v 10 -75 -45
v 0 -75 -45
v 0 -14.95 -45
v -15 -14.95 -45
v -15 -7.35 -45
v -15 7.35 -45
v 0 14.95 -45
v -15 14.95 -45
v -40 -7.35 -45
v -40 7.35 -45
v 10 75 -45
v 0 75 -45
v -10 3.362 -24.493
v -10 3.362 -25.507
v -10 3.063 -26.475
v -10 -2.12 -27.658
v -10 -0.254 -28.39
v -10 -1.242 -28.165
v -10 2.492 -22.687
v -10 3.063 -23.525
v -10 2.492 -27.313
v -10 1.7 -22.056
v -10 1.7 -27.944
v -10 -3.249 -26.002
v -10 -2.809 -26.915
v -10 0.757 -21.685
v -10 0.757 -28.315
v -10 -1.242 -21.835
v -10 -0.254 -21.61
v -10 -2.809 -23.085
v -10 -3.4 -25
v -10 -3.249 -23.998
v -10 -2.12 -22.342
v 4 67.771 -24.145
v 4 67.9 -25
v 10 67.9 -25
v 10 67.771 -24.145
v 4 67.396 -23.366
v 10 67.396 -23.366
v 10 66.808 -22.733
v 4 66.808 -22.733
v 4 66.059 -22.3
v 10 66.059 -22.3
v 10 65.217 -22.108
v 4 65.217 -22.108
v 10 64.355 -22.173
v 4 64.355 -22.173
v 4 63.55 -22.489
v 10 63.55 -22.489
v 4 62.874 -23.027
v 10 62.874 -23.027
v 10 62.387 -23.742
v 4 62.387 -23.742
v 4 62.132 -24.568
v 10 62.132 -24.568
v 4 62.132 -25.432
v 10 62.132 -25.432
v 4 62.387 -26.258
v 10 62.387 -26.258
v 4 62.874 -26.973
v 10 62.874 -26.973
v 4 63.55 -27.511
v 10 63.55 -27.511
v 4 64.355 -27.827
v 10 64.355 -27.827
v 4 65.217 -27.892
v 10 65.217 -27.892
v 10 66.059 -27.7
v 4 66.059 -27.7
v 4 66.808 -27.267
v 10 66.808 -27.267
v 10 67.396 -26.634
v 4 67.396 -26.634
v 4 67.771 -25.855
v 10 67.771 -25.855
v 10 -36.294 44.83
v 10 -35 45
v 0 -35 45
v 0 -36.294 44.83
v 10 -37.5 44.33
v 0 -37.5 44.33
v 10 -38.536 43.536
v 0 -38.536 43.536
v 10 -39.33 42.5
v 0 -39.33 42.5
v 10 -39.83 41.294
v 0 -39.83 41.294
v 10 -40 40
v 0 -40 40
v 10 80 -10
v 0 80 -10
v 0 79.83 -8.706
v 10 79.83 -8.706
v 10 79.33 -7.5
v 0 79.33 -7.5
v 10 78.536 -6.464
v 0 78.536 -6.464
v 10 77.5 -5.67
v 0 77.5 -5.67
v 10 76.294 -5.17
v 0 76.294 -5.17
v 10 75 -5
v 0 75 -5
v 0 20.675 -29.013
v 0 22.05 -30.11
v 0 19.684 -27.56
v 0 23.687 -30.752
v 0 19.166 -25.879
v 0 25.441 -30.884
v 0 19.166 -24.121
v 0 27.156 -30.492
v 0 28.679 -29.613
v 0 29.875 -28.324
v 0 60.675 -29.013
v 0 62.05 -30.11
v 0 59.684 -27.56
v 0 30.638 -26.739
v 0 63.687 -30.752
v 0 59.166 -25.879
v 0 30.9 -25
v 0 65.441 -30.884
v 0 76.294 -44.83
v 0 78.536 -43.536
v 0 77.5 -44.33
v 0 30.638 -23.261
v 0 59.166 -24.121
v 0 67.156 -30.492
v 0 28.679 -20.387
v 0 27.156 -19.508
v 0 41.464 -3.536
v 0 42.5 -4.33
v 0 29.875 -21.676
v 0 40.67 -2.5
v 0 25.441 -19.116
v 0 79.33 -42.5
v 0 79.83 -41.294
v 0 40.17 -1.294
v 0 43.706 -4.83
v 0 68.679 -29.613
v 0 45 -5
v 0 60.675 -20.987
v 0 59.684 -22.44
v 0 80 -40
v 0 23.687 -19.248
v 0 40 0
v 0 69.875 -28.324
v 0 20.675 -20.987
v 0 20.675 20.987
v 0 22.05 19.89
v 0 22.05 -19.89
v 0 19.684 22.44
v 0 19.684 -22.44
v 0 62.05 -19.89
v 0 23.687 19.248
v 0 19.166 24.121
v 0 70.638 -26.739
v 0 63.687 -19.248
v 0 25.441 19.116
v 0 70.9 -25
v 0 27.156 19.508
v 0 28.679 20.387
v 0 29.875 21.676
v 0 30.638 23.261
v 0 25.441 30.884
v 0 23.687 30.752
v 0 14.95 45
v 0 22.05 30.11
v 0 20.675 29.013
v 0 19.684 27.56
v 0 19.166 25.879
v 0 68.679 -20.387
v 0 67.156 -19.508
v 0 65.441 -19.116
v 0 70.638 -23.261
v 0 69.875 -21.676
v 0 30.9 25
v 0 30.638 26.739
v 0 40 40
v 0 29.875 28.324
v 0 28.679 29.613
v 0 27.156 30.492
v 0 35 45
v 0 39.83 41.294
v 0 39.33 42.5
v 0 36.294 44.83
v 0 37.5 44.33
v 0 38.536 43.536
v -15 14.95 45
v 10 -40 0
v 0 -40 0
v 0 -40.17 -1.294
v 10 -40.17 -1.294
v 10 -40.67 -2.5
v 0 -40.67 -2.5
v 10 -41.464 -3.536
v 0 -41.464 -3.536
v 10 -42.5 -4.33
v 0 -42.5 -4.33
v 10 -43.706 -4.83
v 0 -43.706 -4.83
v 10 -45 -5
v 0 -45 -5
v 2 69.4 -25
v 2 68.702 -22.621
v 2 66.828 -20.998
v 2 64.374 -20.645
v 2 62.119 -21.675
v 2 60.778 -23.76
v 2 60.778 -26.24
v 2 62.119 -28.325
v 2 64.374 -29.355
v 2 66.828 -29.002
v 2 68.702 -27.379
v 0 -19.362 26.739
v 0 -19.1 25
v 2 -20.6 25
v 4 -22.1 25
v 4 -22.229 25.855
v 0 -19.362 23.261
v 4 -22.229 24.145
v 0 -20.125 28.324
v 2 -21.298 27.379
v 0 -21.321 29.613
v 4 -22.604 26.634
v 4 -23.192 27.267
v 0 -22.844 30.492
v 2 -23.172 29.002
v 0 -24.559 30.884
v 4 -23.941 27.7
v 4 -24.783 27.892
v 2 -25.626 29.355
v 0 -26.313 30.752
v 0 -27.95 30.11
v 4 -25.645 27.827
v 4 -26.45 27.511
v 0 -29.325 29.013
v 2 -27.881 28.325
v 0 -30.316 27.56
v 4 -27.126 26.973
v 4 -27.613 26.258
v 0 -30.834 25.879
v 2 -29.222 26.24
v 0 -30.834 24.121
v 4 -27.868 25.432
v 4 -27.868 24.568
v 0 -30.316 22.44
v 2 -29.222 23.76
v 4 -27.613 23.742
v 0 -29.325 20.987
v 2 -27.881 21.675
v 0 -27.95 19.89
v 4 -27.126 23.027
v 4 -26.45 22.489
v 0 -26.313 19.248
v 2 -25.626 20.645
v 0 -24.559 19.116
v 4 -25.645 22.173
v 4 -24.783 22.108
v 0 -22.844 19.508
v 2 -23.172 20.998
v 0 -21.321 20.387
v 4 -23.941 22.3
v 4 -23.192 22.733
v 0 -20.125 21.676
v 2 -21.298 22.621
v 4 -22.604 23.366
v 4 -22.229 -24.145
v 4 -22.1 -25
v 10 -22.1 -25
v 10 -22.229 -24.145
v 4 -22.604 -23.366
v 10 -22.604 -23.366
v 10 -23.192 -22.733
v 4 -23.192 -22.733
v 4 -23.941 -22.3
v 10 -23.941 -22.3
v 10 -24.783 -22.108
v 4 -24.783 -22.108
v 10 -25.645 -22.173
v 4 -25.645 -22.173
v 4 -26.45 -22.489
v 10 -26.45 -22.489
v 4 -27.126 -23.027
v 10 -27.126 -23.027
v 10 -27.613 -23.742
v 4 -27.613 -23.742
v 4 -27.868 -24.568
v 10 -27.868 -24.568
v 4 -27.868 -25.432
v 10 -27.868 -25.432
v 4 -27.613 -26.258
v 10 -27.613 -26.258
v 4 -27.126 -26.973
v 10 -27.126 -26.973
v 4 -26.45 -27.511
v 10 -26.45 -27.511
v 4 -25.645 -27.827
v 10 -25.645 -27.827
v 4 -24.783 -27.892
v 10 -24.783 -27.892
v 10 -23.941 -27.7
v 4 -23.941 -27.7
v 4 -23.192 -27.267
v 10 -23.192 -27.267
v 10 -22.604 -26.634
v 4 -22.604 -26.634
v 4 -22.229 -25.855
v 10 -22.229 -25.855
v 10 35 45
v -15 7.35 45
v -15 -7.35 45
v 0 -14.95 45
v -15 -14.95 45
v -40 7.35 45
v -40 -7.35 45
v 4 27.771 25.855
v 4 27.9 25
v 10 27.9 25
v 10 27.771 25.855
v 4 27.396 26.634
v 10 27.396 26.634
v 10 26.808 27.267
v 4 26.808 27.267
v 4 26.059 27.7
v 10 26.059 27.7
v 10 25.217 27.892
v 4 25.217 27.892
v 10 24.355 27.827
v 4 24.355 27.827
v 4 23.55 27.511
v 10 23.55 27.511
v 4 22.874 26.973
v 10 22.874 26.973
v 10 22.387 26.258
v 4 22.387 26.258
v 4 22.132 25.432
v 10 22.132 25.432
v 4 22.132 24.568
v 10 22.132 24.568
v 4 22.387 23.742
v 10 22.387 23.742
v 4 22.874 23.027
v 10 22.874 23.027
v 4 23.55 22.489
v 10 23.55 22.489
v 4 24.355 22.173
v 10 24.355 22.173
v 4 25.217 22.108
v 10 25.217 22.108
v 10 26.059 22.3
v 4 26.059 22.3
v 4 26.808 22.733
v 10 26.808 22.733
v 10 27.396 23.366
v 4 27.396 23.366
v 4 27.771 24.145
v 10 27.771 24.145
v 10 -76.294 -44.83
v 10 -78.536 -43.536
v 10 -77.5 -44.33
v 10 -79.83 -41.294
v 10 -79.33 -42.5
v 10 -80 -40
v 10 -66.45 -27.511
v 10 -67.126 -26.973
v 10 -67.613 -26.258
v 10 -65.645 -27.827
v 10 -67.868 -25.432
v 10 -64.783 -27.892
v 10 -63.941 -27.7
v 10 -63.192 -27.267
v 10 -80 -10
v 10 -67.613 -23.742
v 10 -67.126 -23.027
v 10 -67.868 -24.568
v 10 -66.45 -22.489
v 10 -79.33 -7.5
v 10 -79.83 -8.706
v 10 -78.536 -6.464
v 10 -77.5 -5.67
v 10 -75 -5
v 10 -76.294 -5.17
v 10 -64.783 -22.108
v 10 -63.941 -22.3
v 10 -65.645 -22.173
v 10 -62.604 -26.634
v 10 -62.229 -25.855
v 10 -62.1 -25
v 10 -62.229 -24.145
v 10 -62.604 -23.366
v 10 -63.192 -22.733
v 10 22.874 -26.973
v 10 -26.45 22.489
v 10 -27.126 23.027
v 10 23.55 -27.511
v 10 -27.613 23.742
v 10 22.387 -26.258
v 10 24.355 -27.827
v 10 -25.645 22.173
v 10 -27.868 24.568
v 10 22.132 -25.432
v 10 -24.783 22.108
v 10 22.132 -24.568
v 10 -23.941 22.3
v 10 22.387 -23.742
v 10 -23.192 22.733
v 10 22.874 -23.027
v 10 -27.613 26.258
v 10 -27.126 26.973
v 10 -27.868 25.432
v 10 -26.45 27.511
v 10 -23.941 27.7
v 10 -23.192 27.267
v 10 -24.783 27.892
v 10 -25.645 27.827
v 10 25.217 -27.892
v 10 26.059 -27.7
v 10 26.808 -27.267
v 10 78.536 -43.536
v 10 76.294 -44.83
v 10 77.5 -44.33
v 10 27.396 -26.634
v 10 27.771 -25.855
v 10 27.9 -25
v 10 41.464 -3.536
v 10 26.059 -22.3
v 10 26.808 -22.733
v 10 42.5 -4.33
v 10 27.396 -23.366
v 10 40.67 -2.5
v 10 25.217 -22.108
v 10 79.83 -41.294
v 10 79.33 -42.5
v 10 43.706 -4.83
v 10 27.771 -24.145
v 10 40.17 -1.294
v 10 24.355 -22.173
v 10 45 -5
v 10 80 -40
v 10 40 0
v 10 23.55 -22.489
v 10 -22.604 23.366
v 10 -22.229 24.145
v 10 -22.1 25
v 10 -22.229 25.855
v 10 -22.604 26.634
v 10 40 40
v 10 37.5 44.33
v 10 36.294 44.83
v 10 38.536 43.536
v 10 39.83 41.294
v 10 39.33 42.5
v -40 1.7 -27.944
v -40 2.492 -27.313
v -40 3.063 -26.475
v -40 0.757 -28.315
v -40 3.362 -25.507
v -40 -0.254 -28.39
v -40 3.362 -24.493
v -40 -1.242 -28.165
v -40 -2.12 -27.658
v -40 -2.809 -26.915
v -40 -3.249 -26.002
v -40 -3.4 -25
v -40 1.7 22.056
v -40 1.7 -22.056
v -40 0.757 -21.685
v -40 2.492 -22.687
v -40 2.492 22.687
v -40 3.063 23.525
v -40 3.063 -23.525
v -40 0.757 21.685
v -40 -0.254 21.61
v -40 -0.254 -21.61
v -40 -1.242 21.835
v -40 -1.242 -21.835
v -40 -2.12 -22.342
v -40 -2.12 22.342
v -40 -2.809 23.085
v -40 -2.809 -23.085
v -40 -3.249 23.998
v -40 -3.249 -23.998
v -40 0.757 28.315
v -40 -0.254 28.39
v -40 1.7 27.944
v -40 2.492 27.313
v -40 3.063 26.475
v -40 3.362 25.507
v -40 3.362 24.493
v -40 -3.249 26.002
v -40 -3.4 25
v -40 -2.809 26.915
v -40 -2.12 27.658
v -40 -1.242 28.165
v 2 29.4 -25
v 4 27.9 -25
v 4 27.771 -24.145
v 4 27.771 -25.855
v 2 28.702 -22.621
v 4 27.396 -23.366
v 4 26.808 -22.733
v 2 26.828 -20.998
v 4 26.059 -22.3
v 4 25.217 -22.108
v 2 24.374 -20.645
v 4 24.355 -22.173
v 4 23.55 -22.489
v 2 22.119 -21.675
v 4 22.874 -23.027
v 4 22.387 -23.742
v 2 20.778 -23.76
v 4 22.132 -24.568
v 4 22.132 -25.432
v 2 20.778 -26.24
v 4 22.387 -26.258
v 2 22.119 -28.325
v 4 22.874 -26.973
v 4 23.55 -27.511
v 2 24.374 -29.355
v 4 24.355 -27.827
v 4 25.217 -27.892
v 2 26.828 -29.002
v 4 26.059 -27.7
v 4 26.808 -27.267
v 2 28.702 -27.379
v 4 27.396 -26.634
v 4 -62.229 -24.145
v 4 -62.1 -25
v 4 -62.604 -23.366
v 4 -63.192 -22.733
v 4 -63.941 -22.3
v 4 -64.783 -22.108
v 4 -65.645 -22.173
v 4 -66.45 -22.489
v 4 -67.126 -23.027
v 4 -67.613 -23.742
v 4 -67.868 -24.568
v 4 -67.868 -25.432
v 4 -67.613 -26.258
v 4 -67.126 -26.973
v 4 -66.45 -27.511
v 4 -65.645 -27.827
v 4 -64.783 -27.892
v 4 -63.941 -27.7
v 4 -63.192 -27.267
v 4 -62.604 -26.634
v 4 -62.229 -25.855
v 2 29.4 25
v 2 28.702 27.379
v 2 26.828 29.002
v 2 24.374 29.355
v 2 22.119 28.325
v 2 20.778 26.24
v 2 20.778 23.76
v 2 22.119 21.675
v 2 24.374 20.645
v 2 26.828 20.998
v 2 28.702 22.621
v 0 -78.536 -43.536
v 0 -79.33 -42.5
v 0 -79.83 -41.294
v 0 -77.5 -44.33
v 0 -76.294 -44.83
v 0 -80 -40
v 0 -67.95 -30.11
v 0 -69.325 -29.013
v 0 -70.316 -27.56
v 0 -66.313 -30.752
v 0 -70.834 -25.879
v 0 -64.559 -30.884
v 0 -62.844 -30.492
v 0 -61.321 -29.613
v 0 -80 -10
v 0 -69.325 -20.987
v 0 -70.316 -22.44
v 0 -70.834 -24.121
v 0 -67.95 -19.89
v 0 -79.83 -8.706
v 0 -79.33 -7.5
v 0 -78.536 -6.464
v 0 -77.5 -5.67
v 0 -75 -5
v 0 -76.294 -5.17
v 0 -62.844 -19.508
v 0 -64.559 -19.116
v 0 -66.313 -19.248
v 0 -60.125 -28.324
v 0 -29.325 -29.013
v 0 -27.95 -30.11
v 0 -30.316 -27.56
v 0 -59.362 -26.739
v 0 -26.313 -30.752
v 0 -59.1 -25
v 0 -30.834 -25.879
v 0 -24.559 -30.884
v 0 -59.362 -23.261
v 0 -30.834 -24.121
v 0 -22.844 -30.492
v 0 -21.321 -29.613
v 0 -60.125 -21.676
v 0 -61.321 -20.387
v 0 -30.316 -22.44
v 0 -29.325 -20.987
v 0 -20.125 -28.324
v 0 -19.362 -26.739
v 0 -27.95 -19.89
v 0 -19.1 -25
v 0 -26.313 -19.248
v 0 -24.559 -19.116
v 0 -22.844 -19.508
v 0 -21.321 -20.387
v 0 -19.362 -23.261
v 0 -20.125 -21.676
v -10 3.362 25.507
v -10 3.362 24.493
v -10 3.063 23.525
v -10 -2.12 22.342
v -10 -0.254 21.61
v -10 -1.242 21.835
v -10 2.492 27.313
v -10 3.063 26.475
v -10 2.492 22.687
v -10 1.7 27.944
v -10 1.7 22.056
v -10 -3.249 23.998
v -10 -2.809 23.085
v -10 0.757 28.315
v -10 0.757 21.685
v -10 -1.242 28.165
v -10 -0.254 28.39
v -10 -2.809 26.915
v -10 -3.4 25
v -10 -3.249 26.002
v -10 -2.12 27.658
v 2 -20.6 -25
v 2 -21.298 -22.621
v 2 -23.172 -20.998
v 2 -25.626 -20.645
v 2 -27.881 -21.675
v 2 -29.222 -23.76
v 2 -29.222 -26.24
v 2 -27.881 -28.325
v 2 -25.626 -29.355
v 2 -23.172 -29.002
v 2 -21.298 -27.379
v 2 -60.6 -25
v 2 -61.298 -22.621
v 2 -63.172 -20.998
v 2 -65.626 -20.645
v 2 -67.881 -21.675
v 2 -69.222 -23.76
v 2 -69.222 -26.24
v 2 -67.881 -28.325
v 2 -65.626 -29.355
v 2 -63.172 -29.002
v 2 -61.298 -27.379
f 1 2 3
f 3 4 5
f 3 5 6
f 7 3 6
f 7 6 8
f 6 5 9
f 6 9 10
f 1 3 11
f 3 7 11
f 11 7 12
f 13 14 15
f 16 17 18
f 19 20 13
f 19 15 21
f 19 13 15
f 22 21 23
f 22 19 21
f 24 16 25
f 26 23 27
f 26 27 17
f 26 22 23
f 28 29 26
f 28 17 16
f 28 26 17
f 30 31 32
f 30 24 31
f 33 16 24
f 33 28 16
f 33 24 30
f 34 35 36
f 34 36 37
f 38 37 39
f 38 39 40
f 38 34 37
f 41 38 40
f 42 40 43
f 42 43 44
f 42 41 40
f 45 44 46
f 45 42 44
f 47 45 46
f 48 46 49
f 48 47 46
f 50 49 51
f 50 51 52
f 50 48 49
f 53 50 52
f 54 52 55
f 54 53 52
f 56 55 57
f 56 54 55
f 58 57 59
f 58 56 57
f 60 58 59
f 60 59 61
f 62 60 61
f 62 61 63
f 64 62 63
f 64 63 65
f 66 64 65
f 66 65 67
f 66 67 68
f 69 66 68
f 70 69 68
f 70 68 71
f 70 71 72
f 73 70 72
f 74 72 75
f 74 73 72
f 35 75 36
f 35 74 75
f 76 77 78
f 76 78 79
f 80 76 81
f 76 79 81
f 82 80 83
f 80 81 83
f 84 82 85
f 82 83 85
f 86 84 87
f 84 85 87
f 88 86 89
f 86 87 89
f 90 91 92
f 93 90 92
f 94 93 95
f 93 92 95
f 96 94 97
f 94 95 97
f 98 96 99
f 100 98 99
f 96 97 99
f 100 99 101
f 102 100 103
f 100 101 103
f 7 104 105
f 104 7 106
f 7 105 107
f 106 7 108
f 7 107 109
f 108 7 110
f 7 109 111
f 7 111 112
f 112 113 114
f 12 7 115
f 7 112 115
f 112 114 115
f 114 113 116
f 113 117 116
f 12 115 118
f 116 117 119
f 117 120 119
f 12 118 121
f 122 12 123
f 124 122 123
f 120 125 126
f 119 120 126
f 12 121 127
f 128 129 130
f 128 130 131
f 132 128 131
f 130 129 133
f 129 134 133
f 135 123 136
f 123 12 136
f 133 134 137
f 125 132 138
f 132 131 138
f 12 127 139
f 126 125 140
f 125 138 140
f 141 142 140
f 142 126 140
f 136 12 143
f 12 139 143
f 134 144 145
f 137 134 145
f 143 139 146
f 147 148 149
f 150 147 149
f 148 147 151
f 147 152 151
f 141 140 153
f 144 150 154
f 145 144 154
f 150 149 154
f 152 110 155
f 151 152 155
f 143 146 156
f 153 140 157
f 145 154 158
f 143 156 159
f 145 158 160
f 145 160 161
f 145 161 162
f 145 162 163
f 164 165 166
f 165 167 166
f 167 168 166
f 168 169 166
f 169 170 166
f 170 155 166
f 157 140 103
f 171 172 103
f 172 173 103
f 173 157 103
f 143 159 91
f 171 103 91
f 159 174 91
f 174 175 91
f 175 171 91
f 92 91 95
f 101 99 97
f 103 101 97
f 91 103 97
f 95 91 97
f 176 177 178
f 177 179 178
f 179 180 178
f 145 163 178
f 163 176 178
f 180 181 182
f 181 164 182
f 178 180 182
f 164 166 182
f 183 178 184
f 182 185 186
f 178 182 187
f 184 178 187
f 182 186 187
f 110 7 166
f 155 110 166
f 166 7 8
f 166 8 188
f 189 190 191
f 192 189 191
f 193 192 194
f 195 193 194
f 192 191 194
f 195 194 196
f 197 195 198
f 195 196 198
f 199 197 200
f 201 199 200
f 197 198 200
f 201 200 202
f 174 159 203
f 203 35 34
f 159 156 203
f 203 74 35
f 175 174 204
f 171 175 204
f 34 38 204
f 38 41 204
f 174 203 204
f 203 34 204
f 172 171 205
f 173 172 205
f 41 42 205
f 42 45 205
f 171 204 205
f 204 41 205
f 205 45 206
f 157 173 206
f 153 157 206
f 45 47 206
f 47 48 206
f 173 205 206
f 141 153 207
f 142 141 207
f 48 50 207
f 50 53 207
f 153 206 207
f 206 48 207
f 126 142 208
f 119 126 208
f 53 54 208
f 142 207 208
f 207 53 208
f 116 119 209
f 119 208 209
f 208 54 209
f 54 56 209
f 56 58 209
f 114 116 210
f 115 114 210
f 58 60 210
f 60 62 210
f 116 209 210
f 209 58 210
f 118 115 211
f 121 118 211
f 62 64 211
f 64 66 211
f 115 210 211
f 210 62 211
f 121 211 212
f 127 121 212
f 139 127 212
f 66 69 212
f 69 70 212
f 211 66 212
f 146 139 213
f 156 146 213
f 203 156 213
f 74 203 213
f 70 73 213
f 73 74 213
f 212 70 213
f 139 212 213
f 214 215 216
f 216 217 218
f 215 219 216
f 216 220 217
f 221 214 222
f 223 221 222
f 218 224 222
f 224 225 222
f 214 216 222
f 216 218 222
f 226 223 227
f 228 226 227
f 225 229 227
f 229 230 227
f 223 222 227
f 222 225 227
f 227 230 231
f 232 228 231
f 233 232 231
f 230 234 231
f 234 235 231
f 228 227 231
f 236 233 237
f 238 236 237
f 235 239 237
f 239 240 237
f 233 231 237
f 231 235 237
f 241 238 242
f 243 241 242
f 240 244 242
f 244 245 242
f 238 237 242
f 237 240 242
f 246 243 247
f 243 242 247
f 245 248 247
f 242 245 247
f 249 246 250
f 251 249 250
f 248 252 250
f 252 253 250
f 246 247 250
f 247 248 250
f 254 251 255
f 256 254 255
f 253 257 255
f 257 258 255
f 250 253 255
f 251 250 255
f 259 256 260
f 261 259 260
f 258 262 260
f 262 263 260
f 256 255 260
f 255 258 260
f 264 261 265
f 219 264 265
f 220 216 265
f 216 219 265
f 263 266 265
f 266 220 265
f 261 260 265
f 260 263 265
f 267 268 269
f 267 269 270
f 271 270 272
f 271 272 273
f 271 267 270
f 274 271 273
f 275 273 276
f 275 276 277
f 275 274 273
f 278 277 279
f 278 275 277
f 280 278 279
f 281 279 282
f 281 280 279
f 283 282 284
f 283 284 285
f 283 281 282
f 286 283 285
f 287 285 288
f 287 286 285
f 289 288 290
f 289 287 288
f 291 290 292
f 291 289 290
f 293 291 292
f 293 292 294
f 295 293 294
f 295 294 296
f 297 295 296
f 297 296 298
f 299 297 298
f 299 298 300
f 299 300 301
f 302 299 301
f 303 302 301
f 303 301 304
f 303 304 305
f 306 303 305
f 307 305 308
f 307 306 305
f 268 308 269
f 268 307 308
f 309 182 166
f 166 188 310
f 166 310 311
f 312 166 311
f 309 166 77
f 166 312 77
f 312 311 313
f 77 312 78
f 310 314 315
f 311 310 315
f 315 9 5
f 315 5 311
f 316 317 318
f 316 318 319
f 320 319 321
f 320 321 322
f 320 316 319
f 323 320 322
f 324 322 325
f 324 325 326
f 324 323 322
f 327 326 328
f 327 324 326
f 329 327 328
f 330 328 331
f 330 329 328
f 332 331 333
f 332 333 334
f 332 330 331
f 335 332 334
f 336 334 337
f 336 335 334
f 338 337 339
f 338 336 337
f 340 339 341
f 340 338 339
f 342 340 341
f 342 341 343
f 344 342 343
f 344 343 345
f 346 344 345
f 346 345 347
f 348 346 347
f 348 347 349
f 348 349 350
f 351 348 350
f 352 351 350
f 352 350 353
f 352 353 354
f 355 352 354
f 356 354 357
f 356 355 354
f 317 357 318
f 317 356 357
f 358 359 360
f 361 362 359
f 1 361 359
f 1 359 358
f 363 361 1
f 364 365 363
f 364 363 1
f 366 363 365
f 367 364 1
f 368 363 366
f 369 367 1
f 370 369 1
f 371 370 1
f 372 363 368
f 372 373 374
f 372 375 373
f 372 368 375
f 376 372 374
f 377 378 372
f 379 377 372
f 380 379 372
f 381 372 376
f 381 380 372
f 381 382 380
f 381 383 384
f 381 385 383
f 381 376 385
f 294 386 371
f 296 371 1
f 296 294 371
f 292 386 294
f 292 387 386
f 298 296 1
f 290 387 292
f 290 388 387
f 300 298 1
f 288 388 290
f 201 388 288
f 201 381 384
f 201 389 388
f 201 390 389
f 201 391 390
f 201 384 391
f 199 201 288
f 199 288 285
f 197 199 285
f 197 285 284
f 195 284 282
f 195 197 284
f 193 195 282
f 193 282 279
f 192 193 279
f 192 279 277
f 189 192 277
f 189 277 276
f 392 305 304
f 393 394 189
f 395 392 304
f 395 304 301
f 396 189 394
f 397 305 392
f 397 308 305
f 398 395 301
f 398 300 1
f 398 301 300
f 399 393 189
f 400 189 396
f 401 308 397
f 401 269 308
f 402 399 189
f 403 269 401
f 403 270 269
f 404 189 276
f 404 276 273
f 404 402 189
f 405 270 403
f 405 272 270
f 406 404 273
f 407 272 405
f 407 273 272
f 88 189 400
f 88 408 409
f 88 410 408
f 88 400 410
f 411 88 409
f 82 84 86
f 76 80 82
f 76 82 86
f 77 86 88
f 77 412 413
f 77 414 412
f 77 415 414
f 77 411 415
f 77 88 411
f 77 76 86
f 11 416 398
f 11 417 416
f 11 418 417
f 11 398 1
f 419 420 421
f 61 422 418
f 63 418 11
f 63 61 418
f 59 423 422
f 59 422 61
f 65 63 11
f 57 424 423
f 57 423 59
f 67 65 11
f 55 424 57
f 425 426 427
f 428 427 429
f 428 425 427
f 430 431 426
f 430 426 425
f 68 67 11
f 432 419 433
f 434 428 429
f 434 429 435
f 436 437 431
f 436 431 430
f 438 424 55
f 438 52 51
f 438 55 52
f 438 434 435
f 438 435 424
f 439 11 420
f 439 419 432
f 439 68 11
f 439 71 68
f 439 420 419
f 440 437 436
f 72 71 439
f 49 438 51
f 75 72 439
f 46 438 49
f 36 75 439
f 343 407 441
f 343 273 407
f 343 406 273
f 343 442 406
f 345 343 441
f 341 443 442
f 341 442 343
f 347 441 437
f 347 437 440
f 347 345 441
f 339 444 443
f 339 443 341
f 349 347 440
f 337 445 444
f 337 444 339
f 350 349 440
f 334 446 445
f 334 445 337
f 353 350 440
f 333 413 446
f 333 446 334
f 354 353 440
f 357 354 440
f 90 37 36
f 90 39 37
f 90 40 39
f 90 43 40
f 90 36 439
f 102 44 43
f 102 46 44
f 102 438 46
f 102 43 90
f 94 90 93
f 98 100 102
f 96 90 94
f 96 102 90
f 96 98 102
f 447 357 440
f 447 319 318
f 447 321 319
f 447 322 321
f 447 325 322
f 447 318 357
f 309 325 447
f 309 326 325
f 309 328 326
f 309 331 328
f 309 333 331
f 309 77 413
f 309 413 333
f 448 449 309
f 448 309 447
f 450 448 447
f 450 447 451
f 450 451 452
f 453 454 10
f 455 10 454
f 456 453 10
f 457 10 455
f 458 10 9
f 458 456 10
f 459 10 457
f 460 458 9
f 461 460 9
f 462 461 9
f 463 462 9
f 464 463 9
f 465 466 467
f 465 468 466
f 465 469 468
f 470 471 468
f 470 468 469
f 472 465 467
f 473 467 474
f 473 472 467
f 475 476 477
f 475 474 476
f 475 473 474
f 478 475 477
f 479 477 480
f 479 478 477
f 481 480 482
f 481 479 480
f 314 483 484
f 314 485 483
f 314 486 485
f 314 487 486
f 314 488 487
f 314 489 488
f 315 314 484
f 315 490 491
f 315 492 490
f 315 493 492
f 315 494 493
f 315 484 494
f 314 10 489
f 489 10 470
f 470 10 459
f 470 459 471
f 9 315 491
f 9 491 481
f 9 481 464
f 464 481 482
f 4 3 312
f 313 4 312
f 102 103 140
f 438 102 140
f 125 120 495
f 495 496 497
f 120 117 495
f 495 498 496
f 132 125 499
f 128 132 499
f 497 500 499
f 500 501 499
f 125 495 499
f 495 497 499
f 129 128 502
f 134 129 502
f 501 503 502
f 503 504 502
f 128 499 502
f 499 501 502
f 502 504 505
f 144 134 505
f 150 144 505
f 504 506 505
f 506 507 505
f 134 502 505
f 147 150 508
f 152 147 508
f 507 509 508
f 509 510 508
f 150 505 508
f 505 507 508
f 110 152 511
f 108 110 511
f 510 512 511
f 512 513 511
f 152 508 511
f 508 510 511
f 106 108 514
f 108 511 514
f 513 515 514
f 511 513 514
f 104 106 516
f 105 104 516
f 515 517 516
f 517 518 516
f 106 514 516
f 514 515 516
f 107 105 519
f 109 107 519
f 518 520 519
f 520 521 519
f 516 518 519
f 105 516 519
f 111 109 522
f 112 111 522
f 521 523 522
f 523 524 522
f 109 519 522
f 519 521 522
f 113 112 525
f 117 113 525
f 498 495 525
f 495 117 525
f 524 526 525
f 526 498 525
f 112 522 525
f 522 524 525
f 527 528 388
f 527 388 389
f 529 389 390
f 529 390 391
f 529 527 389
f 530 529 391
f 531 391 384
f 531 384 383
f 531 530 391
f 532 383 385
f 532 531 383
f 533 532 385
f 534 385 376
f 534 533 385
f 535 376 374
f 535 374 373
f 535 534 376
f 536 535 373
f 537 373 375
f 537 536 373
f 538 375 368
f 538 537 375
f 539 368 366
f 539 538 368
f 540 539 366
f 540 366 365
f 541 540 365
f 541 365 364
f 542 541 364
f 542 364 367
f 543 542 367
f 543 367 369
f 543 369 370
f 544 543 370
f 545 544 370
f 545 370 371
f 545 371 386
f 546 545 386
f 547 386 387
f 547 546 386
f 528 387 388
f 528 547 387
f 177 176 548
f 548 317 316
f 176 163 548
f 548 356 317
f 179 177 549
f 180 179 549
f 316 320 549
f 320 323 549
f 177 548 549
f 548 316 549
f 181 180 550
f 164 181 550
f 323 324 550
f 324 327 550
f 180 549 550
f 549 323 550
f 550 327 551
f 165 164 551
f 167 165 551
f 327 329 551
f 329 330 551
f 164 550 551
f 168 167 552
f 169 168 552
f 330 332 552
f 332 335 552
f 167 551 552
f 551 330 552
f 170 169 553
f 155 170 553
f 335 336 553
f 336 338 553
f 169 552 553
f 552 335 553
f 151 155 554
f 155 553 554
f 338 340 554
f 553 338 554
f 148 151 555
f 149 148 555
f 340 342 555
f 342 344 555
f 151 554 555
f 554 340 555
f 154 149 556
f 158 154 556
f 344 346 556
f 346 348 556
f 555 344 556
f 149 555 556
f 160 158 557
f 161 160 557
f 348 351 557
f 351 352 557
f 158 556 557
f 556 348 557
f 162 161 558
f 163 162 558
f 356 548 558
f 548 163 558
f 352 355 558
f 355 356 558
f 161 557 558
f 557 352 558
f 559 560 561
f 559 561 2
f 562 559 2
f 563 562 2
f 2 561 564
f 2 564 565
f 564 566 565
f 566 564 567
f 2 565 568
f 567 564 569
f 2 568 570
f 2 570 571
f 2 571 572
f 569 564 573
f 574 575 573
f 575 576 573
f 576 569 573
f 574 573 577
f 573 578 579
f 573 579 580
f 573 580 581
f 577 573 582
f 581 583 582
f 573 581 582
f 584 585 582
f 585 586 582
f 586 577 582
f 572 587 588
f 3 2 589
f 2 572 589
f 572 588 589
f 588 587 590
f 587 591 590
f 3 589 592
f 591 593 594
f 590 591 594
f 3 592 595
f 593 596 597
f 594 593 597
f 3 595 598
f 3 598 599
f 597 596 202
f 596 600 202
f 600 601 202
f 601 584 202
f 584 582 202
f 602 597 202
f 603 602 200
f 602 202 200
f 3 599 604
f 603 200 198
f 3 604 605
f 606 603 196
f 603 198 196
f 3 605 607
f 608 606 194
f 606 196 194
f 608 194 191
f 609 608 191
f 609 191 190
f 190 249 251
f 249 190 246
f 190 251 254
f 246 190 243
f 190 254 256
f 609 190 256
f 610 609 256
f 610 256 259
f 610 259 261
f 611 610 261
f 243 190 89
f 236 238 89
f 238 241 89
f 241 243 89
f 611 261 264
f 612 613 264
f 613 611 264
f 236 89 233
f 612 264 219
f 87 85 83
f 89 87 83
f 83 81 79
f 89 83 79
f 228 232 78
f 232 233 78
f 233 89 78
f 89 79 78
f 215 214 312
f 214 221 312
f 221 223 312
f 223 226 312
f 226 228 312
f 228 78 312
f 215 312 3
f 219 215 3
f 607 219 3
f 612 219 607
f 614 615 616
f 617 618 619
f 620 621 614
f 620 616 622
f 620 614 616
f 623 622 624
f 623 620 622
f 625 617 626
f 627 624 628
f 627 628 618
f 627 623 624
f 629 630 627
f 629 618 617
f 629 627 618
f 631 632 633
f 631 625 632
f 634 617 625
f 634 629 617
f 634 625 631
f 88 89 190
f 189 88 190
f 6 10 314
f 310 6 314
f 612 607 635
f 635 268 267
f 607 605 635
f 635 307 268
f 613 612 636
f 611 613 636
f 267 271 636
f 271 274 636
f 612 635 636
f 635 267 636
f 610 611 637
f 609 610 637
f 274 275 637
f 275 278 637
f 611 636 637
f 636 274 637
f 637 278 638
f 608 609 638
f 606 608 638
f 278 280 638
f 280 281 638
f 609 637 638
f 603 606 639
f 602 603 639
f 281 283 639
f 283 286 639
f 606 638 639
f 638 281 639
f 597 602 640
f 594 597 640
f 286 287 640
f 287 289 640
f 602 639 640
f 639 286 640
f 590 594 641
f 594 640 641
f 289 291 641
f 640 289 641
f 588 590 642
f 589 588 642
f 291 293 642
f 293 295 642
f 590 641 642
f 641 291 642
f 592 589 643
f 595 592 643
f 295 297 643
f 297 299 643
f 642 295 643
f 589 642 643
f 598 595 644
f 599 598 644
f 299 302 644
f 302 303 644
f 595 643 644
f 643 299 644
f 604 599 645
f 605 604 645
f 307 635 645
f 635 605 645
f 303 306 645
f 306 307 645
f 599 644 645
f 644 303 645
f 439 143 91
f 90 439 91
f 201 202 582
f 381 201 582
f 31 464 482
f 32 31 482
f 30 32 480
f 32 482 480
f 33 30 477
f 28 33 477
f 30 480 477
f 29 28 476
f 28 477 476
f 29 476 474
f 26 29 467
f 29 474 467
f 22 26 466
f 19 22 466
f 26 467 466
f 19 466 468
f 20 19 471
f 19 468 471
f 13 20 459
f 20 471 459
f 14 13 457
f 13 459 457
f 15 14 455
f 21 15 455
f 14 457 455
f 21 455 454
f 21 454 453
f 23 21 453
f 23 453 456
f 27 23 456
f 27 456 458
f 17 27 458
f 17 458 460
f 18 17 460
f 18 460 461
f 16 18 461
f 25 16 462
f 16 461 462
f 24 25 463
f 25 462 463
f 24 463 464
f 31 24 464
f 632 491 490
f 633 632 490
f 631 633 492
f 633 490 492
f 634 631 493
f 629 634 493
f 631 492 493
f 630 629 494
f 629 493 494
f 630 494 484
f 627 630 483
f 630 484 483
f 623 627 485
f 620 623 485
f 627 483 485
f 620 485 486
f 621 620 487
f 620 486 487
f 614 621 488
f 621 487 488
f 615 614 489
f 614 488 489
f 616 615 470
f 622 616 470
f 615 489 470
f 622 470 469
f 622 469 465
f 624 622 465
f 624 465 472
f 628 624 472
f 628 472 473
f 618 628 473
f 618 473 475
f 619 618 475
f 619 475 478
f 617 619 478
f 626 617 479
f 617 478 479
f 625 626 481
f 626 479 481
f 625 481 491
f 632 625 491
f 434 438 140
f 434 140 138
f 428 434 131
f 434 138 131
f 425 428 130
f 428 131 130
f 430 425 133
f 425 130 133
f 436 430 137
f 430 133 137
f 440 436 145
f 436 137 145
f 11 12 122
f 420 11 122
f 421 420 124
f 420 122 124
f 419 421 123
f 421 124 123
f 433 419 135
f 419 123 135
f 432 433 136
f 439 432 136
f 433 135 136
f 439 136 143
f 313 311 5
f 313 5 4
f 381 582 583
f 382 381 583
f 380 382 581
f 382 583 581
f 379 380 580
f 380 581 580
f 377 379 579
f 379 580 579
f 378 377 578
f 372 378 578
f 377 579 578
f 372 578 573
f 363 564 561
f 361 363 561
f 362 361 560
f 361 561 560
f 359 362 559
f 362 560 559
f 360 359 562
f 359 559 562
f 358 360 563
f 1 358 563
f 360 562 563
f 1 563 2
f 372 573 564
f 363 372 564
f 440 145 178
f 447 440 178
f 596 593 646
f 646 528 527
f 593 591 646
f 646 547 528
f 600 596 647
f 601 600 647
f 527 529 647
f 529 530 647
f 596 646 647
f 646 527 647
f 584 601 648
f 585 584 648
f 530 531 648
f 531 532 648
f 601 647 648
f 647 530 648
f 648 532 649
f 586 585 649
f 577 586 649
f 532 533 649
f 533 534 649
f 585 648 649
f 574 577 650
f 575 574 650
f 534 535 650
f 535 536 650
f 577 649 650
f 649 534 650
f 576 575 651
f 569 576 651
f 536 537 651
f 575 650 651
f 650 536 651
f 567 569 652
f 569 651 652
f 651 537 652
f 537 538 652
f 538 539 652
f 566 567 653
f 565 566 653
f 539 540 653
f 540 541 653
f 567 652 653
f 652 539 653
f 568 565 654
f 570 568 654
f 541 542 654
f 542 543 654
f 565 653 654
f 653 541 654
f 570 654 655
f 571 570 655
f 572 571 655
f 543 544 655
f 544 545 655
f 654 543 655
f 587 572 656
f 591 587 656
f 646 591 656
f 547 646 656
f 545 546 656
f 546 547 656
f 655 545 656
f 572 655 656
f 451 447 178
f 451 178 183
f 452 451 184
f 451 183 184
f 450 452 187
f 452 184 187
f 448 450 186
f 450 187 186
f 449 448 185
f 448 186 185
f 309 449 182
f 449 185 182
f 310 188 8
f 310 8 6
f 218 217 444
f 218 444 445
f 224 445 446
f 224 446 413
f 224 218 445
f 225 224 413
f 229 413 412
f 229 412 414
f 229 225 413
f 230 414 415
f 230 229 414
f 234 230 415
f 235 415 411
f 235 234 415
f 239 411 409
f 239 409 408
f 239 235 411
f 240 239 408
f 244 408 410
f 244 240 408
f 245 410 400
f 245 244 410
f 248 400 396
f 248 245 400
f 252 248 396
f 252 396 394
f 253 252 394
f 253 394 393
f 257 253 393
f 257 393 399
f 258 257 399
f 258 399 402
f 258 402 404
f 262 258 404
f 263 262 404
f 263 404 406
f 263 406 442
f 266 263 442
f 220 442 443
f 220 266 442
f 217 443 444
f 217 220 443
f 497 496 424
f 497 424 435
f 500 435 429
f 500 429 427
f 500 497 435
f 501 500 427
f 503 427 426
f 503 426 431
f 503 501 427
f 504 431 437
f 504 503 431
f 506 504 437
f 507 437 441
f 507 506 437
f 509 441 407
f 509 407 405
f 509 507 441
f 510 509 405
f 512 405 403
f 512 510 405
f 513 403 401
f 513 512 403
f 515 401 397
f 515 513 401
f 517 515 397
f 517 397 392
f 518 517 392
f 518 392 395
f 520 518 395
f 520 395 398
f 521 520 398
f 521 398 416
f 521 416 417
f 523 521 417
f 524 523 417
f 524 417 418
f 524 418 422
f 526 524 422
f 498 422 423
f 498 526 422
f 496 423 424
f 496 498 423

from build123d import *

# Parameters (mm, degrees)
F0_R     = 2.9
F1_DEPTH = 10
F2_W     = 29.9
F2_H     = 90
F3_DEPTH = 40
F4_W     = 7.6
F4_H     = 90
F5_DEPTH = 25
F6_R     = 3.4
F7_DEPTH = 30
F8_SIZE2 = 4
F8_SIZE  = 3


with BuildPart() as f1:
    # F0 (on Right) → F1 (new body)
    with BuildSketch(Plane.YZ):
        with BuildLine():
            Line((-75, -45), (75, -45))
            ThreePointArc((75, -45), (78.535534, -43.535534), (80, -40))
            Line((80, -40), (80, -10))
            ThreePointArc((80, -10), (78.535534, -6.464466), (75, -5))
            Line((75, -5), (45, -5))
            ThreePointArc((45, -5), (41.464466, -3.535534), (40, 0))
            Line((40, 0), (40, 40))
            ThreePointArc((40, 40), (38.535534, 43.535534), (35, 45))
            Line((35, 45), (-35, 45))
            ThreePointArc((-35, 45), (-38.535534, 43.535534), (-40, 40))
            Line((-40, 40), (-40, 0))
            ThreePointArc((-40, 0), (-41.464466, -3.535534), (-45, -5))
            Line((-45, -5), (-75, -5))
            ThreePointArc((-75, -5), (-78.535534, -6.464466), (-80, -10))
            Line((-80, -10), (-80, -40))
            ThreePointArc((-80, -40), (-78.535534, -43.535534), (-75, -45))
        make_face()
        with Locations((-65, -25)):
            Circle(F0_R, mode=Mode.SUBTRACT)
        with Locations((-25, -25)):
            Circle(F0_R, mode=Mode.SUBTRACT)
        with Locations((25, -25)):
            Circle(F0_R, mode=Mode.SUBTRACT)
        with Locations((65, -25)):
            Circle(F0_R, mode=Mode.SUBTRACT)
        with Locations((-25, 25)):
            Circle(F0_R, mode=Mode.SUBTRACT)
        with Locations((25, 25)):
            Circle(F0_R, mode=Mode.SUBTRACT)
    extrude(amount=F1_DEPTH)

    # F2 (on face) → F3 (join)
    with BuildSketch(Plane(origin=(0, 0, 0), x_dir=(0, -1, 0), z_dir=(-1, 0, 0))):
        Rectangle(F2_W, F2_H)
    extrude(amount=F3_DEPTH)

    # F4 (on face) → F5 (cut)
    with BuildSketch(Plane(origin=(-40, 0, 0), x_dir=(0, -1, 0), z_dir=(-1, 0, 0))):
        with Locations((-11.15, 0)):
            Rectangle(F4_W, F4_H)
        with Locations((11.15, 0)):
            Rectangle(F4_W, F4_H)
    extrude(amount=-F5_DEPTH, mode=Mode.SUBTRACT)

    # F6 (on face) → F7 (cut)
    with BuildSketch(Plane(origin=(-40, 0, 0), x_dir=(0, -1, 0), z_dir=(-1, 0, 0))):
        with Locations((0, 25)):
            Circle(F6_R)
        with Locations((0, -25)):
            Circle(F6_R)
    extrude(amount=-F7_DEPTH, mode=Mode.SUBTRACT)

    # F8
    f8_edges = [f1.edges().sort_by_distance(p)[0] for p in [
        (0, 22.1, 25),
        (0, -27.9, 25),
        (0, -67.9, -25),
        (0, -27.9, -25),
        (0, 22.1, -25),
        (0, 62.1, -25),
    ]]
    chamfer(f8_edges, length=F8_SIZE, length2=F8_SIZE2)


solid = f1.part
